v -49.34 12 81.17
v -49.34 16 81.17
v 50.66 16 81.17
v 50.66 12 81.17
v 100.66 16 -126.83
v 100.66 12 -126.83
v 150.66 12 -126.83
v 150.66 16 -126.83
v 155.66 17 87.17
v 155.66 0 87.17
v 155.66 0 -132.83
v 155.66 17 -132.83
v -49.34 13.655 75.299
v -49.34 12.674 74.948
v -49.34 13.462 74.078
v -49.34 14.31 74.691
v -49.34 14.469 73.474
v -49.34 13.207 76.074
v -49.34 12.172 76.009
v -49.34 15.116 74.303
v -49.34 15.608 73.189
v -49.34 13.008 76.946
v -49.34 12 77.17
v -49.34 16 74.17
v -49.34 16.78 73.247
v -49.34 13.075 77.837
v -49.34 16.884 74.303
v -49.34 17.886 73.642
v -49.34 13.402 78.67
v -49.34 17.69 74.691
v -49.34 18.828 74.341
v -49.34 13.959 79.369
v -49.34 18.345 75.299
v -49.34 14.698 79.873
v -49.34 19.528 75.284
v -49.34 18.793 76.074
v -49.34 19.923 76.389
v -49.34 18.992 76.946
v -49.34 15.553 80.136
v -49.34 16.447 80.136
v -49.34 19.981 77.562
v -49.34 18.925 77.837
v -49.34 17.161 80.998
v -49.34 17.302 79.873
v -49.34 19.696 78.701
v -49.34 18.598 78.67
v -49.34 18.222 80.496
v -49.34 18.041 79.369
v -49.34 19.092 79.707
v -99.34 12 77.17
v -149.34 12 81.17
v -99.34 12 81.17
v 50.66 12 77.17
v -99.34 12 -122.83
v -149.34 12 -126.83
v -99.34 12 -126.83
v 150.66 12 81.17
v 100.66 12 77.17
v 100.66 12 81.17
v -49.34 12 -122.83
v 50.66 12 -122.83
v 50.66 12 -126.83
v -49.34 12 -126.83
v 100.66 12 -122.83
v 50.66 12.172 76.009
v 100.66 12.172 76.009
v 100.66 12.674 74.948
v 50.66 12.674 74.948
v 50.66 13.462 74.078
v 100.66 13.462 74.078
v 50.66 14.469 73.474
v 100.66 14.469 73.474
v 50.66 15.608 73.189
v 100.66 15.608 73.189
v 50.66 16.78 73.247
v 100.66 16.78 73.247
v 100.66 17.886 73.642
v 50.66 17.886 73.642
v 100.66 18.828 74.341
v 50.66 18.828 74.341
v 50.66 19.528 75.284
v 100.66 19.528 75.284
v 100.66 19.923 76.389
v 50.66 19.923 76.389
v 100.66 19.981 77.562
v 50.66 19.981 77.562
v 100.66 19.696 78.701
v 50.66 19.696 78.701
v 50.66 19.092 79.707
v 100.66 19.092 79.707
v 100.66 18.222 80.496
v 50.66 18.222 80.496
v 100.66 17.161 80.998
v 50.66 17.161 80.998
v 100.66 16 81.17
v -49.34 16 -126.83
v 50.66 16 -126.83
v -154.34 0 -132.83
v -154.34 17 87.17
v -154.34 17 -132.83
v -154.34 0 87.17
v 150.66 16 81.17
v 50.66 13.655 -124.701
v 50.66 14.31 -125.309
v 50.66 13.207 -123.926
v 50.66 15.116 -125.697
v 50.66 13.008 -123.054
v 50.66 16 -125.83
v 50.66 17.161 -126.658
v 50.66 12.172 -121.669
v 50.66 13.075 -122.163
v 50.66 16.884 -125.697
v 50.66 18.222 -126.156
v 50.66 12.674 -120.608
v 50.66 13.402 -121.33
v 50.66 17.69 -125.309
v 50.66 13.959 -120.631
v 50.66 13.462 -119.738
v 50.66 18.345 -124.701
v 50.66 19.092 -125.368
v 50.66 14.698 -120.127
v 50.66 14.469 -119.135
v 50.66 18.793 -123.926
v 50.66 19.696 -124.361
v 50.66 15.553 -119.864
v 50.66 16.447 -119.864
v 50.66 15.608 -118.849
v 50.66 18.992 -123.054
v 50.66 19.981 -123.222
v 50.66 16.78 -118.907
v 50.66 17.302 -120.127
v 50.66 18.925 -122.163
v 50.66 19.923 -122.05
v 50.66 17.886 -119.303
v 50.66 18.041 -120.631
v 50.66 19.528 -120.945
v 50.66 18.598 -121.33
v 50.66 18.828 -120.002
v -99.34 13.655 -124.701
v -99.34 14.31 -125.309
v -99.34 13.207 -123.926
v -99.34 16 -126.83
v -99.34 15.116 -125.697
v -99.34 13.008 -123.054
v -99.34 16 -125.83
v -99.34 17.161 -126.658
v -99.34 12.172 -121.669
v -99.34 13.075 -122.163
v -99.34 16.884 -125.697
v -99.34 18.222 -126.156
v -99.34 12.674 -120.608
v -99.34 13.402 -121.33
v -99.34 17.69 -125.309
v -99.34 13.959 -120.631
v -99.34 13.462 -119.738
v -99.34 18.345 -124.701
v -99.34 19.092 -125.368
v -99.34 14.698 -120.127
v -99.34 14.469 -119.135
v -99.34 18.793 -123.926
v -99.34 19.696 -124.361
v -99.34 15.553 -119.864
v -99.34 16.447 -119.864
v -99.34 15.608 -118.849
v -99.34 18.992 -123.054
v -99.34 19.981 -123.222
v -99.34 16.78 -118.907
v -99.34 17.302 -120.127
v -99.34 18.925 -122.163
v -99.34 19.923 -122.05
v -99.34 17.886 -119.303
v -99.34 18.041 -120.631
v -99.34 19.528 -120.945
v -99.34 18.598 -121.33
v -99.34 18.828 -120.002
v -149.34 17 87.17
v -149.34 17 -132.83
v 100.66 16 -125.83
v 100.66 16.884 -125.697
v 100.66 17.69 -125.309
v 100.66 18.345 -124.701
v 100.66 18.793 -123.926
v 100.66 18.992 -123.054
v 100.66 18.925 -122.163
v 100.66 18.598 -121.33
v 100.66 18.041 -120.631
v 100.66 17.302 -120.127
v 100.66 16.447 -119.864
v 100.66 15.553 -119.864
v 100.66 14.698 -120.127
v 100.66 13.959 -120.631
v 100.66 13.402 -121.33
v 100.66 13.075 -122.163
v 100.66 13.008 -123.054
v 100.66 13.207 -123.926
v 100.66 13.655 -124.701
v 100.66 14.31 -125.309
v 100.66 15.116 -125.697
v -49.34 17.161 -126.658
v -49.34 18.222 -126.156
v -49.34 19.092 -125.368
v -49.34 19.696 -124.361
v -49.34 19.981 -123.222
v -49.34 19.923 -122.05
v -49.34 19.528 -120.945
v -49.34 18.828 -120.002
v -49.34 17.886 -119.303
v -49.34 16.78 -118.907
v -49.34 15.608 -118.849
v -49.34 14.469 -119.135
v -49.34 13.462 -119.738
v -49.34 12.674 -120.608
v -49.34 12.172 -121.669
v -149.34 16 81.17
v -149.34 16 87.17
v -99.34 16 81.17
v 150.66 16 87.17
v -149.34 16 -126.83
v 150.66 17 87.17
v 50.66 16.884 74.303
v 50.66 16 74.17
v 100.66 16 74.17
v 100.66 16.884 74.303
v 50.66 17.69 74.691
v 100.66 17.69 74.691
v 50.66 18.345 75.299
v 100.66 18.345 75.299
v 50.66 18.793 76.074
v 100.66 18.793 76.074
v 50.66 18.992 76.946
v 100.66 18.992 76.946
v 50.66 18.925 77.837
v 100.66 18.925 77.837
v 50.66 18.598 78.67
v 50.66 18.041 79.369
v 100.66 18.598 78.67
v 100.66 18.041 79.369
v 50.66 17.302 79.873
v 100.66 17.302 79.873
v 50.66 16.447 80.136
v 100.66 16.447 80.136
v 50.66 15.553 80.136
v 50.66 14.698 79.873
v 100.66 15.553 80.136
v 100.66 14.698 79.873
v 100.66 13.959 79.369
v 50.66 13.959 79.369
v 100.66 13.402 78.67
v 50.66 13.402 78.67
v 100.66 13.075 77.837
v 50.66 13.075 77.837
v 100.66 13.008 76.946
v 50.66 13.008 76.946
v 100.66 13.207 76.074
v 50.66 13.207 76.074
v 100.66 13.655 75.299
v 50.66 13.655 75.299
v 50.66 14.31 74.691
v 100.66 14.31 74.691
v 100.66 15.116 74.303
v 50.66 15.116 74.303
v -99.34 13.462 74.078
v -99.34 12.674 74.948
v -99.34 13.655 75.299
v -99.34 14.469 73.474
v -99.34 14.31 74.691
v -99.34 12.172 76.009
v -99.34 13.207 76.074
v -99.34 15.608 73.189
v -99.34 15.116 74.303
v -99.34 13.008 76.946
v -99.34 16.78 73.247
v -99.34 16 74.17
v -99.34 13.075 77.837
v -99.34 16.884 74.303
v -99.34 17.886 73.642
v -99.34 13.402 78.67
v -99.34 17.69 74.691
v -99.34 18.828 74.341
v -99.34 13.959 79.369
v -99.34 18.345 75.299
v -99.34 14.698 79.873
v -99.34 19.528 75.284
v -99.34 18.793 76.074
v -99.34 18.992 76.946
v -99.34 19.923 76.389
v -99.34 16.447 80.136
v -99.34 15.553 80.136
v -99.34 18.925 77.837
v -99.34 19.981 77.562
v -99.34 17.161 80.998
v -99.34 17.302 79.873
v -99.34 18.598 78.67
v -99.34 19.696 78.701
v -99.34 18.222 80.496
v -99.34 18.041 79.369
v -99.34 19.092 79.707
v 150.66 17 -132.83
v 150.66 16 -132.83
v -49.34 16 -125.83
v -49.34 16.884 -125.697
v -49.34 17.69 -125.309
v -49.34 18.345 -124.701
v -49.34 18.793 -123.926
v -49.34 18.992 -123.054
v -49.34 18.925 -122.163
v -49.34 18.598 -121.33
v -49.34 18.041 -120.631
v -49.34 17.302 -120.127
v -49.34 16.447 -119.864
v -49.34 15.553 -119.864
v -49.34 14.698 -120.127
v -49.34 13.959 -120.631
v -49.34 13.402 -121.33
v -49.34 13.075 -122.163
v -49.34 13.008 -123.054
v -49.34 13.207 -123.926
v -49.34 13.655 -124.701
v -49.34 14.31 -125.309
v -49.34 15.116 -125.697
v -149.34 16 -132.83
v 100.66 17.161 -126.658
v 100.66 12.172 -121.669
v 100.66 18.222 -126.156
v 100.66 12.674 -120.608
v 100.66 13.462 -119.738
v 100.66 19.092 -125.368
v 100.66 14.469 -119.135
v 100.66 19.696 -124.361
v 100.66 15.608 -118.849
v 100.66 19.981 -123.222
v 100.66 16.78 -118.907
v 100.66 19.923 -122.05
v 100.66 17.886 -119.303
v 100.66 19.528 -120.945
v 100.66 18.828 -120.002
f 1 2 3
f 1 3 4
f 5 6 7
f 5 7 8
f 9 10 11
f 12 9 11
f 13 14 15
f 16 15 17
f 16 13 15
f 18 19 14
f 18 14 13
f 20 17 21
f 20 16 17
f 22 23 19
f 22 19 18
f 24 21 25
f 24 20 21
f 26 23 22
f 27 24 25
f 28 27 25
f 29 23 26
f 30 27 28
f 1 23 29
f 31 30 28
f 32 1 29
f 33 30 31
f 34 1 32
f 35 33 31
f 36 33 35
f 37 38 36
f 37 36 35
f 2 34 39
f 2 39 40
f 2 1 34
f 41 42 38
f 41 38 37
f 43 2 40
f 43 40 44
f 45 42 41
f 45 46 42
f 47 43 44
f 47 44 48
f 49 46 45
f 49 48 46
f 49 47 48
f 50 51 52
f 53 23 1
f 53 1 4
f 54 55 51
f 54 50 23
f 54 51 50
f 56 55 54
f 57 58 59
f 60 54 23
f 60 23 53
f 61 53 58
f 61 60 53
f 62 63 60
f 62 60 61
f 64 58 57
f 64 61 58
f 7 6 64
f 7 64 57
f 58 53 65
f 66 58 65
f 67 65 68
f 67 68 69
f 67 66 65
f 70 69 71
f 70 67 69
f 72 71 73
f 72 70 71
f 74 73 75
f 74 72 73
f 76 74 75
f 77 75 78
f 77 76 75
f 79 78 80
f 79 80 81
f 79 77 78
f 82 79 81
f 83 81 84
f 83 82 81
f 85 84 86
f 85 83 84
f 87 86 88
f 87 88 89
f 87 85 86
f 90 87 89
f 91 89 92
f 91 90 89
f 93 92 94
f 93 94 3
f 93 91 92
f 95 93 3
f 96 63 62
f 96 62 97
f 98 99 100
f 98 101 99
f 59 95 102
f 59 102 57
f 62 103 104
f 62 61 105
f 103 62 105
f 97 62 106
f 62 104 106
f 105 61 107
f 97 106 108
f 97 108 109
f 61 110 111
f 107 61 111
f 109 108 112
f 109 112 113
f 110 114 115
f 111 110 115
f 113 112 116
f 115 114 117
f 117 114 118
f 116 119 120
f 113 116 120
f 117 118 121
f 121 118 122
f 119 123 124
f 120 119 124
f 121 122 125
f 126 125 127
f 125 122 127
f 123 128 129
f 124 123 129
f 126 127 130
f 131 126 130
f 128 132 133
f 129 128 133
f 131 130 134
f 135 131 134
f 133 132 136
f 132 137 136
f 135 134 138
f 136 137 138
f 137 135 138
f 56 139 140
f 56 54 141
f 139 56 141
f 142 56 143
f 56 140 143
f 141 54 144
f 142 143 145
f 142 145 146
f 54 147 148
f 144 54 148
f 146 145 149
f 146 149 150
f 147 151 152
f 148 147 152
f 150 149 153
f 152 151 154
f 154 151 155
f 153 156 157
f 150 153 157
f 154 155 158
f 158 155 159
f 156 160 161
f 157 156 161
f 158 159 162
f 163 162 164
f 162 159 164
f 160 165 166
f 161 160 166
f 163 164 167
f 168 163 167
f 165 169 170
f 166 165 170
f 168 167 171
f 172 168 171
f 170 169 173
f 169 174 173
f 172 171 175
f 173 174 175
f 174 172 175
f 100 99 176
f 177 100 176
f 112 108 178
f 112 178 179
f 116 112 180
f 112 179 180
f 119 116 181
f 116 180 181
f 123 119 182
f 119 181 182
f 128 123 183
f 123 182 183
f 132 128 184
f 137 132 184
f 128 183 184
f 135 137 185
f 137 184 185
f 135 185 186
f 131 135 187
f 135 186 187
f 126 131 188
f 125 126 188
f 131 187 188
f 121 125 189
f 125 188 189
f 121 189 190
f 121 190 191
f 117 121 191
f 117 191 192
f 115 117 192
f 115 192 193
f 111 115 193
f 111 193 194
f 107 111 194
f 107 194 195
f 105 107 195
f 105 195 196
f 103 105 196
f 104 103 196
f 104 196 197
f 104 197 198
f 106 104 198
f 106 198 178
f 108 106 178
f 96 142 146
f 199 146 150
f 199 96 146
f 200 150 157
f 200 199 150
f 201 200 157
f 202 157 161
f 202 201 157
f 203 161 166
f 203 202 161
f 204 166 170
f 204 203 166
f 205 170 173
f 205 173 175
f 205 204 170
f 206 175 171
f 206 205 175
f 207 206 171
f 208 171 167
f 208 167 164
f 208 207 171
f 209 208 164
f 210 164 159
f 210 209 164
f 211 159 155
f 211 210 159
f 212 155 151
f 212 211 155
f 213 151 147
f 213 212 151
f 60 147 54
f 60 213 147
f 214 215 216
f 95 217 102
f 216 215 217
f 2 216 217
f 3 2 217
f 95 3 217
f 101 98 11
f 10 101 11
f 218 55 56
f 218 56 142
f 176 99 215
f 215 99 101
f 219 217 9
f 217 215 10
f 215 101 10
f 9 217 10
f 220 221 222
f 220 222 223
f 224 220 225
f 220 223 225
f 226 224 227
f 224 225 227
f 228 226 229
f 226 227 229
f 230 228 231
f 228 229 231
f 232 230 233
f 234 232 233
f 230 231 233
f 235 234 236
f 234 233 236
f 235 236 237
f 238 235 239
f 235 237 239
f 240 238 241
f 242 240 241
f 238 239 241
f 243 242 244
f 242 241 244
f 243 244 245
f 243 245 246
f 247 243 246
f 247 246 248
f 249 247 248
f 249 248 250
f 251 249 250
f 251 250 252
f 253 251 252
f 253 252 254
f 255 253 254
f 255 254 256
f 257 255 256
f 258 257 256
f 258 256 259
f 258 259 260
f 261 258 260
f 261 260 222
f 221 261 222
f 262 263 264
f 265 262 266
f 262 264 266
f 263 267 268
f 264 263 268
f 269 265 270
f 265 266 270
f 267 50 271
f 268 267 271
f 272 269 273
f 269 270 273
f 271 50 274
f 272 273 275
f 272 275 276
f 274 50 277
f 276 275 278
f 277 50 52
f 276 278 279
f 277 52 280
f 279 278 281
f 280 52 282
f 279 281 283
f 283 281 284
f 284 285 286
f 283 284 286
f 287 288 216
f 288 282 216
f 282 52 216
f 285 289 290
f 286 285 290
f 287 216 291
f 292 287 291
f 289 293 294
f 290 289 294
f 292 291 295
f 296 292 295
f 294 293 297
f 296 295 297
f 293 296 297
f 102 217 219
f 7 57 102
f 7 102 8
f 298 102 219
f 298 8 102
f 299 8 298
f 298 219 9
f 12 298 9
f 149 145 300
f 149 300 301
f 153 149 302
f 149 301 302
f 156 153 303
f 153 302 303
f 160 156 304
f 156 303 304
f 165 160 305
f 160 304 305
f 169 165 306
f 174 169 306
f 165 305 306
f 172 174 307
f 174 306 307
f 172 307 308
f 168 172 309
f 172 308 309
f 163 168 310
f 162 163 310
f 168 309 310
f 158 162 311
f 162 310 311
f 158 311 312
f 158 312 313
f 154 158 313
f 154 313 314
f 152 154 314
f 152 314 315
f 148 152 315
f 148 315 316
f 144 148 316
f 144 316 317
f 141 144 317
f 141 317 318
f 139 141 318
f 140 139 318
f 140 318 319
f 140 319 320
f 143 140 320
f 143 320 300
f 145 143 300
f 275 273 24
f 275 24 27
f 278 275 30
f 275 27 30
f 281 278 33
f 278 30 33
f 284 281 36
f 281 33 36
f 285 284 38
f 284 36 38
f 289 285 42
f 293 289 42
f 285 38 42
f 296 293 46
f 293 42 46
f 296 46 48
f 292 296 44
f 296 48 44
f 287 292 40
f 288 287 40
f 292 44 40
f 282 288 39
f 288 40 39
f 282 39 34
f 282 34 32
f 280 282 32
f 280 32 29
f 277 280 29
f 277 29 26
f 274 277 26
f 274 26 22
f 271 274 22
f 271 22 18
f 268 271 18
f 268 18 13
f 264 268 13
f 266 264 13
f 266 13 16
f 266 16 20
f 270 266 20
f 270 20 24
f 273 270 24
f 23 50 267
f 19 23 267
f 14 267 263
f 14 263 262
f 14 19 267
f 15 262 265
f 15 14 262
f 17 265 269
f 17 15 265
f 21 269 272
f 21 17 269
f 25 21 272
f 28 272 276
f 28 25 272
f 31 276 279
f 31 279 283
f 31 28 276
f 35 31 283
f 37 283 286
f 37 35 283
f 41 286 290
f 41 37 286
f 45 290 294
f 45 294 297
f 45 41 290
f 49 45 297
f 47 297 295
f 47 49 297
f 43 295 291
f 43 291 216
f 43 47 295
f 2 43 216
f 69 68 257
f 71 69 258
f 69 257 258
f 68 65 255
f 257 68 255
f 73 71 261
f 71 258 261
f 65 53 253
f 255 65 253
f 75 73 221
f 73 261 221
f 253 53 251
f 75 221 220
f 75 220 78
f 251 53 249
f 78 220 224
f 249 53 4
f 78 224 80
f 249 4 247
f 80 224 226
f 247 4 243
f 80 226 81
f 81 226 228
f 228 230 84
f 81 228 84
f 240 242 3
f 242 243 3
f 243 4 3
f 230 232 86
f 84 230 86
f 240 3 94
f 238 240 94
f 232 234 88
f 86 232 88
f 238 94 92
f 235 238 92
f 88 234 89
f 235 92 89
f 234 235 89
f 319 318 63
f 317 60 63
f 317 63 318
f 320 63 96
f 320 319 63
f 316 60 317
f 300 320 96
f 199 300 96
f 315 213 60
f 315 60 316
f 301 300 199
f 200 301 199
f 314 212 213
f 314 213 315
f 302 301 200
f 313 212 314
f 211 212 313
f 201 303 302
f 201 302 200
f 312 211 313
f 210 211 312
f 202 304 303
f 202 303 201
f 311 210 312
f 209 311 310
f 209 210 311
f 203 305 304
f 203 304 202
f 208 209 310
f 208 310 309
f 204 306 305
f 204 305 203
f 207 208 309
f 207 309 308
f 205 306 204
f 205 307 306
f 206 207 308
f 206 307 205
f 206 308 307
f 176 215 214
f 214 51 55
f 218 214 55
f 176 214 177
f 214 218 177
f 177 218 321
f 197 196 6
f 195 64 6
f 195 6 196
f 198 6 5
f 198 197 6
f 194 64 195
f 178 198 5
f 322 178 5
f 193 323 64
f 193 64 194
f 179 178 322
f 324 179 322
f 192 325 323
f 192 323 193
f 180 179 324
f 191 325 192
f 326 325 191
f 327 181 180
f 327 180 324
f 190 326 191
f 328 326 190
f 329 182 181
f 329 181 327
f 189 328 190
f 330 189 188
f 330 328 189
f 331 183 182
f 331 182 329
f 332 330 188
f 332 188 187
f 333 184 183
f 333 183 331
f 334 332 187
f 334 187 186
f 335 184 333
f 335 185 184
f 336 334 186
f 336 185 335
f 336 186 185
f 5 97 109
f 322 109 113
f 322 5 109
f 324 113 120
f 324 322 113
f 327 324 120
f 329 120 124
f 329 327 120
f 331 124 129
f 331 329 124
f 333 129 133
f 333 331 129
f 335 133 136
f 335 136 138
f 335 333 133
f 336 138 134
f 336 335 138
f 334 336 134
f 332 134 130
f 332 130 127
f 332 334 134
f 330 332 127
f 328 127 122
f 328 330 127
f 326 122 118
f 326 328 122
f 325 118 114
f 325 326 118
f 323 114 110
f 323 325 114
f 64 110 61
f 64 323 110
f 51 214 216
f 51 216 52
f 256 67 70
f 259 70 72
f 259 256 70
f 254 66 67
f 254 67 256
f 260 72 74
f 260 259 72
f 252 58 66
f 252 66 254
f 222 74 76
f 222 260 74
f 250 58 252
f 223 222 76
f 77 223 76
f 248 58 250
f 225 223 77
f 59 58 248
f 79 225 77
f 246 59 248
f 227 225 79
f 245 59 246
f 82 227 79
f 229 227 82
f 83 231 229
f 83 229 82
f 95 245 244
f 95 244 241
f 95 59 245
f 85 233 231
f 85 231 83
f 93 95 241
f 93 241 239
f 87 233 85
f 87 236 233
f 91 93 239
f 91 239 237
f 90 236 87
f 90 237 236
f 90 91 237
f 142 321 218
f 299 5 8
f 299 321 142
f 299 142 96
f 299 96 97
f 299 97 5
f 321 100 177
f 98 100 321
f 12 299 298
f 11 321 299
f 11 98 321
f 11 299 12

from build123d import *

# Parameters (mm, degrees)
SKETCH_1_W                 = 310
SKETCH_1_H                 = 220
EXTRUDE_1_DEPTH            = 12
SKETCH_8_W                 = 310
SKETCH_8_H                 = 10
EXTRUDE_12_DEPTH           = 4
SKETCH_10_R                = 4
CUT_EXTRUDE_5_DEPTH        = 305
SKETCH_11_W                = 4
SKETCH_11_H                = 4
EXTRUDE_13_DEPTH           = 5
EXTRUDE_START              = 300
SKETCH_12_R                = 4
SKETCH_12_R_2              = 3
EXTRUDE_1_2_DEPTH          = 300
SPLIT_START                = -49.339622642
SPLIT_BODIES_2_OUTLINE_R   = 3
SPLIT_BODIES_2_DEPTH       = 100
SPLIT_START_2              = -149.339622642
SPLIT_BODIES_2_2_OUTLINE_R = 3
SPLIT_BODIES_2_2_DEPTH     = 50
SPLIT_START_3              = 100.660377358
SPLIT_BODIES_2_3_OUTLINE_R = 3
SPLIT_BODIES_2_3_DEPTH     = 50
SKETCH_14_W                = 50
SKETCH_14_H                = 8
SKETCH_14_W_2              = 100
EXTRUDE_14_DEPTH           = 12
SKETCH_15_W                = 5
SKETCH_15_H                = 220
EXTRUDE_15_DEPTH           = 5


# Read off the part's stored shape, not the designer's step: 分割2
with BuildPart() as part:
    # 草图1 → Extrude 1 (new body)
    with BuildSketch(Plane(origin=(0, 0, 0), x_dir=(1, 0, 0), z_dir=(0, 1, 0))):
        with Locations((0.660377358, 22.830188679)):
            Rectangle(SKETCH_1_W, SKETCH_1_H)
    extrude(amount=EXTRUDE_1_DEPTH)

    # 草图8 → 凸台-拉伸12 (add)
    with BuildSketch(Plane(origin=(0, 12, 0), x_dir=(1, 0, 0), z_dir=(0, 1, 0))):
        with Locations((0.660377358, 127.830188679)):
            Rectangle(SKETCH_8_W, SKETCH_8_H)
        with Locations((0.660377358, -82.169811321)):
            Rectangle(SKETCH_8_W, SKETCH_8_H)
    extrude(amount=EXTRUDE_12_DEPTH)

    # 草图10 → 切除-拉伸5 (cut)
    with BuildSketch(Plane(origin=(155.660377358, 0, 0), x_dir=(0, 0, -1), z_dir=(1, 0, 0))):
        with Locations((-77.169811321, 16)):
            Circle(SKETCH_10_R)
        with Locations((122.830188679, 16)):
            Circle(SKETCH_10_R)
    extrude(amount=-CUT_EXTRUDE_5_DEPTH, mode=Mode.SUBTRACT)

    # 草图11 → 凸台-拉伸13 (add)
    with BuildSketch(Plane(origin=(155.660377358, 0, 0), x_dir=(0, 0, -1), z_dir=(1, 0, 0))):
        with Locations((-79.169811321, 14)):
            Rectangle(SKETCH_11_W, SKETCH_11_H)
        with Locations((124.830188679, 14)):
            Rectangle(SKETCH_11_W, SKETCH_11_H)
    extrude(amount=-EXTRUDE_13_DEPTH)

    # 草图12 → Extrude 1 2 (add)
    # profile 1 of 2: a face of its own
    with BuildSketch(Plane(origin=(-149.339622642, 0, 0), x_dir=(0, 0, -1), z_dir=(1, 0, 0)).offset(EXTRUDE_START)):
        with Locations((-77.169811321, 16)):
            Circle(SKETCH_12_R)
        with Locations((-77.169811321, 16)):
            Circle(SKETCH_12_R_2, mode=Mode.SUBTRACT)
    # profile 2 of 2: a face of its own
    with BuildSketch(Plane(origin=(-149.339622642, 0, 0), x_dir=(0, 0, -1), z_dir=(1, 0, 0)).offset(EXTRUDE_START)):
        with Locations((122.830188679, 16)):
            Circle(SKETCH_12_R)
        with Locations((122.830188679, 16)):
            Circle(SKETCH_12_R_2, mode=Mode.SUBTRACT)
    extrude(amount=-EXTRUDE_1_2_DEPTH)

    # Split Bodies 2 outline → Split Bodies 2 (cut)
    # profile 1 of 2: a face of its own
    with BuildSketch(Plane.YZ.offset(SPLIT_START)):
        with BuildLine():
            Line((12, -122.830188679), (12, -118.830188679))
            Line((12, -118.830188679), (0, -118.830188679))
            Line((0, -118.830188679), (0, -126.830188679))
            Line((0, -126.830188679), (16, -126.830188679))
            ThreePointArc((16, -126.830188679), (18.828427125, -120.001761554), (12, -122.830188679))
        make_face()
        with Locations((16, -122.830188679)):
            Circle(SPLIT_BODIES_2_OUTLINE_R, mode=Mode.SUBTRACT)
    # profile 2 of 2: a face of its own
    with BuildSketch(Plane.YZ.offset(SPLIT_START)):
        with BuildLine():
            Line((0, 73.169811321), (12, 73.169811321))
            Line((12, 73.169811321), (12, 77.169811321))
            ThreePointArc((12, 77.169811321), (18.828427125, 74.341384196), (16, 81.169811321))
            Line((16, 81.169811321), (0, 81.169811321))
            Line((0, 81.169811321), (0, 73.169811321))
        make_face()
        with Locations((16, 77.169811321)):
            Circle(SPLIT_BODIES_2_OUTLINE_R, mode=Mode.SUBTRACT)
    extrude(amount=SPLIT_BODIES_2_DEPTH, mode=Mode.SUBTRACT)

    # Split Bodies 2 2 outline → Split Bodies 2 2 (cut)
    # profile 1 of 2: a face of its own
    with BuildSketch(Plane.YZ.offset(SPLIT_START_2)):
        with BuildLine():
            Line((12, -122.830188679), (12, -118.830188679))
            Line((12, -118.830188679), (0, -118.830188679))
            Line((0, -118.830188679), (0, -126.830188679))
            Line((0, -126.830188679), (16, -126.830188679))
            ThreePointArc((16, -126.830188679), (18.828427125, -120.001761554), (12, -122.830188679))
        make_face()
        with Locations((16, -122.830188679)):
            Circle(SPLIT_BODIES_2_2_OUTLINE_R, mode=Mode.SUBTRACT)
    # profile 2 of 2: a face of its own
    with BuildSketch(Plane.YZ.offset(SPLIT_START_2)):
        with BuildLine():
            Line((0, 73.169811321), (12, 73.169811321))
            Line((12, 73.169811321), (12, 77.169811321))
            ThreePointArc((12, 77.169811321), (18.828427125, 74.341384196), (16, 81.169811321))
            Line((16, 81.169811321), (0, 81.169811321))
            Line((0, 81.169811321), (0, 73.169811321))
        make_face()
        with Locations((16, 77.169811321)):
            Circle(SPLIT_BODIES_2_2_OUTLINE_R, mode=Mode.SUBTRACT)
    extrude(amount=SPLIT_BODIES_2_2_DEPTH, mode=Mode.SUBTRACT)

    # Split Bodies 2 3 outline → Split Bodies 2 3 (cut)
    # profile 1 of 2: a face of its own
    with BuildSketch(Plane.YZ.offset(SPLIT_START_3)):
        with BuildLine():
            Line((12, -122.830188679), (12, -118.830188679))
            Line((12, -118.830188679), (0, -118.830188679))
            Line((0, -118.830188679), (0, -126.830188679))
            Line((0, -126.830188679), (16, -126.830188679))
            ThreePointArc((16, -126.830188679), (18.828427125, -120.001761554), (12, -122.830188679))
        make_face()
        with Locations((16, -122.830188679)):
            Circle(SPLIT_BODIES_2_3_OUTLINE_R, mode=Mode.SUBTRACT)
    # profile 2 of 2: a face of its own
    with BuildSketch(Plane.YZ.offset(SPLIT_START_3)):
        with BuildLine():
            Line((0, 73.169811321), (12, 73.169811321))
            Line((12, 73.169811321), (12, 77.169811321))
            ThreePointArc((12, 77.169811321), (18.828427125, 74.341384196), (16, 81.169811321))
            Line((16, 81.169811321), (0, 81.169811321))
            Line((0, 81.169811321), (0, 73.169811321))
        make_face()
        with Locations((16, 77.169811321)):
            Circle(SPLIT_BODIES_2_3_OUTLINE_R, mode=Mode.SUBTRACT)
    extrude(amount=SPLIT_BODIES_2_3_DEPTH, mode=Mode.SUBTRACT)

    # 草图14 → 凸台-拉伸14 (add)
    with BuildSketch(Plane(origin=(0, 12, 0), x_dir=(1, 0, 0), z_dir=(0, 1, 0))):
        with Locations((-124.339622642, 122.830188679)):
            Rectangle(SKETCH_14_W, SKETCH_14_H)
        with Locations((125.660377358, 122.830188679)):
            Rectangle(SKETCH_14_W, SKETCH_14_H)
        with Locations((-124.339622642, -77.169811321)):
            Rectangle(SKETCH_14_W, SKETCH_14_H)
        with Locations((125.660377358, -77.169811321)):
            Rectangle(SKETCH_14_W, SKETCH_14_H)
        with Locations((0.660377358, -77.169811321)):
            Rectangle(SKETCH_14_W_2, SKETCH_14_H)
        with Locations((0.660377358, 122.830188679)):
            Rectangle(SKETCH_14_W_2, SKETCH_14_H)
    extrude(amount=-EXTRUDE_14_DEPTH)

    # 草图15 → 凸台-拉伸15 (add)
    with BuildSketch(Plane(origin=(0, 12, 0), x_dir=(1, 0, 0), z_dir=(0, 1, 0))):
        with Locations((-151.839622642, 22.830188679)):
            Rectangle(SKETCH_15_W, SKETCH_15_H)
        with Locations((153.160377358, 22.830188679)):
            Rectangle(SKETCH_15_W, SKETCH_15_H)
    extrude(amount=EXTRUDE_15_DEPTH)


solid = part.part
